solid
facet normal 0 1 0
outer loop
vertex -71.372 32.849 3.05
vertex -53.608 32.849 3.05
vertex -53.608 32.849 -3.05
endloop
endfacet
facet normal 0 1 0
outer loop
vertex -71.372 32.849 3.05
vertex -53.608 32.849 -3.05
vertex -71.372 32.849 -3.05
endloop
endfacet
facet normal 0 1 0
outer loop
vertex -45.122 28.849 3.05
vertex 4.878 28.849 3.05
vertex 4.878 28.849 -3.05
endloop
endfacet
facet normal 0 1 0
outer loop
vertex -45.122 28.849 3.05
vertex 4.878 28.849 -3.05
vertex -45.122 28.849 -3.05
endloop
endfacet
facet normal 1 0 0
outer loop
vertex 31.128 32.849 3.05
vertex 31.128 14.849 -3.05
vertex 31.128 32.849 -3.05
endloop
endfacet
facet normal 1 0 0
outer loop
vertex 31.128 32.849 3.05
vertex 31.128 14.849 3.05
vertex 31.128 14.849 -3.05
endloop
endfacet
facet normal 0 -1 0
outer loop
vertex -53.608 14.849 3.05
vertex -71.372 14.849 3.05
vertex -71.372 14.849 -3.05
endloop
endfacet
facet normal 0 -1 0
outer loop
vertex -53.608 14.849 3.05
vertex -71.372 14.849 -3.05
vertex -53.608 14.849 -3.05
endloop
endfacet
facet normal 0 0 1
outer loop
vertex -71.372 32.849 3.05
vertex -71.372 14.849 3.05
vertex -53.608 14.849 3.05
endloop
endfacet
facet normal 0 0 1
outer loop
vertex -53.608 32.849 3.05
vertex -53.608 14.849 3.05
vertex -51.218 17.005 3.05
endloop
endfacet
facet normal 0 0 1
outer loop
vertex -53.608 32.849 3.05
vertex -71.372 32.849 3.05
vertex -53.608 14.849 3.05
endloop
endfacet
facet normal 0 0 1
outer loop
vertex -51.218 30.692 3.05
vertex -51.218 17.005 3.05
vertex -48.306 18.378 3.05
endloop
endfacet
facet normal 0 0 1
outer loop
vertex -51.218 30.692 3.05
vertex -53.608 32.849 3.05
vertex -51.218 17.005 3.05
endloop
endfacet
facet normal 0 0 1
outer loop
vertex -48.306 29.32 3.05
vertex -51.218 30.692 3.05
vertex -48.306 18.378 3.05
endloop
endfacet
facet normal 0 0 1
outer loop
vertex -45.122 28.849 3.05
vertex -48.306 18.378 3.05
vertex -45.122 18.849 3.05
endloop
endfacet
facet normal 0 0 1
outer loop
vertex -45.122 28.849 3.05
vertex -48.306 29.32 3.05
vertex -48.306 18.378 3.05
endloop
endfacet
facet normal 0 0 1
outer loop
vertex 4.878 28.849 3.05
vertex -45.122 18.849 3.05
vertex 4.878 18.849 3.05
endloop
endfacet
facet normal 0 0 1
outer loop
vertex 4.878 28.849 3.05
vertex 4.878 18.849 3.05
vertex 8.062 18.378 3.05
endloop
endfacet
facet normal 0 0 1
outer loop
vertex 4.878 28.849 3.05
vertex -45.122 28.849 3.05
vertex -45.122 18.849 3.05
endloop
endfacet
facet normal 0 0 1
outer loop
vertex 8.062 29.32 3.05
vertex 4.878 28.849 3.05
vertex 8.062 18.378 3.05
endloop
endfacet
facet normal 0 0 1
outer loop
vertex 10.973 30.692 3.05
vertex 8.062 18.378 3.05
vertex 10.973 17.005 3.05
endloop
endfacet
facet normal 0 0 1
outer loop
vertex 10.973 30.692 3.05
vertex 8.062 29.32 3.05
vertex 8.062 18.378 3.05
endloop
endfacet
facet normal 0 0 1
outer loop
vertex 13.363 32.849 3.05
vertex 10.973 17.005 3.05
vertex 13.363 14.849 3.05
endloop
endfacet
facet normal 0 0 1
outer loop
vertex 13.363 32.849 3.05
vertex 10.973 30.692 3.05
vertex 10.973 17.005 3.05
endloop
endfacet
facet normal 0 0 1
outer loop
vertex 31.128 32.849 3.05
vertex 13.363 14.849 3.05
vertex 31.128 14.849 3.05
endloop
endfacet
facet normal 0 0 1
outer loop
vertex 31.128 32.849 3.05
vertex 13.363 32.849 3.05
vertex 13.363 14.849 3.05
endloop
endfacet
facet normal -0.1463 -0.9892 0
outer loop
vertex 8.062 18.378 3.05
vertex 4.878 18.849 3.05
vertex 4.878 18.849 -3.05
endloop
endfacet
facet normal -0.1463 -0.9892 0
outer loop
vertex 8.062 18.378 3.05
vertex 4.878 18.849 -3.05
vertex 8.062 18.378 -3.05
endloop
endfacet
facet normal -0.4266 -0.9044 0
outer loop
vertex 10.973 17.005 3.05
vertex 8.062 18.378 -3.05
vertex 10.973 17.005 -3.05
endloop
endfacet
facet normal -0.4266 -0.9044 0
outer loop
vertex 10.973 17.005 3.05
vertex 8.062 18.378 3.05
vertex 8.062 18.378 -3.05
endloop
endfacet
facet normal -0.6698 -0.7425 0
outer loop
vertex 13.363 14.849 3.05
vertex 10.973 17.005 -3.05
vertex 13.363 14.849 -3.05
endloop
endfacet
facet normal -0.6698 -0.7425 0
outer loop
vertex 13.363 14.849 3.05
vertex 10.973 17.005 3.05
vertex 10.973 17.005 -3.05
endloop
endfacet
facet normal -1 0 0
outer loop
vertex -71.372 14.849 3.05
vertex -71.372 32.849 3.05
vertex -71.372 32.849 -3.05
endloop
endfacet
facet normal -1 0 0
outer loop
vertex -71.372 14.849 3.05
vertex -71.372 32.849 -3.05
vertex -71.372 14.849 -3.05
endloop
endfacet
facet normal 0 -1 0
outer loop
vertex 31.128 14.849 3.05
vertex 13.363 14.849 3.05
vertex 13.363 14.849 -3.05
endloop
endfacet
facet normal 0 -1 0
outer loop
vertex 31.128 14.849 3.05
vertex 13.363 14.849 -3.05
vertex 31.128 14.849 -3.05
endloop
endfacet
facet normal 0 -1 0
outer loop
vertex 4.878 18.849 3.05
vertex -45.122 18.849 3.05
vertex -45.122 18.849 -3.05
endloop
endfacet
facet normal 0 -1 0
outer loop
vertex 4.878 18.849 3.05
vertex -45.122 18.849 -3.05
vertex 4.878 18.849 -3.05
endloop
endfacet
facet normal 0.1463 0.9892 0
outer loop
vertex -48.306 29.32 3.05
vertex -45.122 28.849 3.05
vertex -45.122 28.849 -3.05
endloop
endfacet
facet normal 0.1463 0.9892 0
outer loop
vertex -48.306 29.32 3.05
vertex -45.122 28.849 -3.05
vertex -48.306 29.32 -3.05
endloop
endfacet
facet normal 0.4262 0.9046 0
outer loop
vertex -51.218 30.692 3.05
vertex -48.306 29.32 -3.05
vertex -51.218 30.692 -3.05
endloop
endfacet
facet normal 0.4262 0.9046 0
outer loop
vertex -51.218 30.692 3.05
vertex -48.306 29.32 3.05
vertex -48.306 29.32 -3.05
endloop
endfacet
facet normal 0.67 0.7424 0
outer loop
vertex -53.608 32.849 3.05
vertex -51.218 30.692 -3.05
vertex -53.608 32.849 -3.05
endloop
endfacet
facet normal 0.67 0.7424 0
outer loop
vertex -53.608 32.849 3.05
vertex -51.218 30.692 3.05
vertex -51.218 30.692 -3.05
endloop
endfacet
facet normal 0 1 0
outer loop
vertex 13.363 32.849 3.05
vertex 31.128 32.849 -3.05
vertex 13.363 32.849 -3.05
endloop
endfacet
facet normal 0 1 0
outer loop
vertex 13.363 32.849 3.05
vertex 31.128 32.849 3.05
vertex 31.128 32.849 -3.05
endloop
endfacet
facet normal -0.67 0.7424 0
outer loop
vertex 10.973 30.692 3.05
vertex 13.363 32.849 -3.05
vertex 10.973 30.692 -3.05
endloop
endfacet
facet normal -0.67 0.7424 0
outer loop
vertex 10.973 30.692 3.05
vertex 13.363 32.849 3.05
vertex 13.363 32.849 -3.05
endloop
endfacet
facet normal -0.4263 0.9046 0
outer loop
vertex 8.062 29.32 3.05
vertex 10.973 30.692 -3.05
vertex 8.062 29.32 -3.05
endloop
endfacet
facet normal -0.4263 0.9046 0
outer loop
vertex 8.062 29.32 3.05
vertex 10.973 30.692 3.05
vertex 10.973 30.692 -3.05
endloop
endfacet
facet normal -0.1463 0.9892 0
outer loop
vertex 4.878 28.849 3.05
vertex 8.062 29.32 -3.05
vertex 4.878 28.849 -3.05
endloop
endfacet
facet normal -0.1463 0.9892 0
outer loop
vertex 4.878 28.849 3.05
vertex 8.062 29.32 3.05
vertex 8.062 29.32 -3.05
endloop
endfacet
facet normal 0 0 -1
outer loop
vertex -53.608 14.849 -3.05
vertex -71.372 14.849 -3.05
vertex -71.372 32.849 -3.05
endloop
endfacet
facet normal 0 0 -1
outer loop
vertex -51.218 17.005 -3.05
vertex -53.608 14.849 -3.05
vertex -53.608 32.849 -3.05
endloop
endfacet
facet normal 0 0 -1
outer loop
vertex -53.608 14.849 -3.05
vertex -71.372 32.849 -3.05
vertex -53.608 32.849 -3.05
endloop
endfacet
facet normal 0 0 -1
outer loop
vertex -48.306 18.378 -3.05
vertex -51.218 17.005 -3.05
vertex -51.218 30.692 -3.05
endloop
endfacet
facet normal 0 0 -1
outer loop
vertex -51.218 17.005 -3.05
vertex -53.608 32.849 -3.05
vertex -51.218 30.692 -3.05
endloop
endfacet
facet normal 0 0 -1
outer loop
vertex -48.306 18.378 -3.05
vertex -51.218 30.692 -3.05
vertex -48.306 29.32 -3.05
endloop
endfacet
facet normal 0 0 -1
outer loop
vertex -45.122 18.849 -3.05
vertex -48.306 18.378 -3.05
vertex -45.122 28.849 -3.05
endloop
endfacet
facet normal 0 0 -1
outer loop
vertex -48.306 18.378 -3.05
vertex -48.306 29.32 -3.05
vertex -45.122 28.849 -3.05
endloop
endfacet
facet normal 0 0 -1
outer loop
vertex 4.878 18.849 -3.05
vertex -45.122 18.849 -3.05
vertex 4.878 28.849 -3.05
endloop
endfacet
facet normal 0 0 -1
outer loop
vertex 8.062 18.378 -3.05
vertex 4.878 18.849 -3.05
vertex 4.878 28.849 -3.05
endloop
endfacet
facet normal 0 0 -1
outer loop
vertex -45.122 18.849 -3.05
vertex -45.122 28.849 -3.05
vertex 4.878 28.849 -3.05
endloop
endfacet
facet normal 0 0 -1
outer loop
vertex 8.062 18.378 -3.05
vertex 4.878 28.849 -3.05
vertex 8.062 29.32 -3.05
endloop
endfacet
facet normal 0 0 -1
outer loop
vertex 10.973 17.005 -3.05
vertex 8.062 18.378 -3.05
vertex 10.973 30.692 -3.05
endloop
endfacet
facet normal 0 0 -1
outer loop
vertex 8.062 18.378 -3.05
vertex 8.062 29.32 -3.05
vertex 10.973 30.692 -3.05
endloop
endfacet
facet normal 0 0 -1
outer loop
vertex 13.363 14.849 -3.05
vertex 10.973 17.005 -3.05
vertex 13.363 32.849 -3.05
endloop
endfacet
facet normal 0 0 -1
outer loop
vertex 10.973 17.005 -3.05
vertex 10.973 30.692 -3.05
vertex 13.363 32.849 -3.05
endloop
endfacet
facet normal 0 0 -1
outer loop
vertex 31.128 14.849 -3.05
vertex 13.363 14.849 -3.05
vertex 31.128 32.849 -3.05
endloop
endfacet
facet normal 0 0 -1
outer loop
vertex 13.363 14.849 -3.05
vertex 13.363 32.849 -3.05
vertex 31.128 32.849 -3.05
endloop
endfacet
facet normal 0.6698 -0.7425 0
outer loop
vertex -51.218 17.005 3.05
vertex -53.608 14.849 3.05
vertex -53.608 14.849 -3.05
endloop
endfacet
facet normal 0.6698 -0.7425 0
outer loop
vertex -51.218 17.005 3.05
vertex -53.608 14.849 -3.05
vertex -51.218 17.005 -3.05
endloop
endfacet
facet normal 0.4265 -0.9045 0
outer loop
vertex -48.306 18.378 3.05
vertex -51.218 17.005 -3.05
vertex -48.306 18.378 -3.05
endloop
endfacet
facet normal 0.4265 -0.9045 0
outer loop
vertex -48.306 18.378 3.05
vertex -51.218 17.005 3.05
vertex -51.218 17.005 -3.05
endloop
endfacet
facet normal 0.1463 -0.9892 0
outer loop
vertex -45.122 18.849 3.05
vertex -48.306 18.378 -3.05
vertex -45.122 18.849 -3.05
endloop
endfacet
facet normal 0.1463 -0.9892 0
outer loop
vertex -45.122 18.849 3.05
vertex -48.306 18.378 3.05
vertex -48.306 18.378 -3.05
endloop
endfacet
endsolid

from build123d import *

# Parameters (mm, degrees)
F1_DEPTH = 3.05


with BuildPart() as f1:
    # F0 (on Top) → F1 (new body, symmetric)
    with BuildSketch(Plane.XY):
        with BuildLine():
            ThreePointArc((13.3630401454, 32.8485820591), (9.568174531, 29.8987076881), (4.8777587712, 28.8485820591))
            Line((4.8777587712, 28.8485820591), (-45.1222412288, 28.8485820591))
            ThreePointArc((-45.1222412288, 28.8485820591), (-49.8126569886, 29.8987076881), (-53.6075226031, 32.8485820591))
            Line((-53.6075226031, 32.8485820591), (-71.3722412288, 32.8485820591))
            Line((-71.3722412288, 32.8485820591), (-71.3722412288, 14.8485820591))
            Line((-71.3722412288, 14.8485820591), (-53.6075226031, 14.8485820591))
            ThreePointArc((-53.6075226031, 14.8485820591), (-49.8126569886, 17.7984564302), (-45.1222412288, 18.8485820591))
            Line((-45.1222412288, 18.8485820591), (4.8777587712, 18.8485820591))
            ThreePointArc((4.8777587712, 18.8485820591), (9.568174531, 17.7984564302), (13.3630401454, 14.8485820591))
            Line((13.3630401454, 14.8485820591), (31.1277587712, 14.8485820591))
            Line((31.1277587712, 14.8485820591), (31.1277587712, 32.8485820591))
            Line((31.1277587712, 32.8485820591), (13.3630401454, 32.8485820591))
        make_face()
    extrude(amount=F1_DEPTH, both=True)


solid = f1.part
